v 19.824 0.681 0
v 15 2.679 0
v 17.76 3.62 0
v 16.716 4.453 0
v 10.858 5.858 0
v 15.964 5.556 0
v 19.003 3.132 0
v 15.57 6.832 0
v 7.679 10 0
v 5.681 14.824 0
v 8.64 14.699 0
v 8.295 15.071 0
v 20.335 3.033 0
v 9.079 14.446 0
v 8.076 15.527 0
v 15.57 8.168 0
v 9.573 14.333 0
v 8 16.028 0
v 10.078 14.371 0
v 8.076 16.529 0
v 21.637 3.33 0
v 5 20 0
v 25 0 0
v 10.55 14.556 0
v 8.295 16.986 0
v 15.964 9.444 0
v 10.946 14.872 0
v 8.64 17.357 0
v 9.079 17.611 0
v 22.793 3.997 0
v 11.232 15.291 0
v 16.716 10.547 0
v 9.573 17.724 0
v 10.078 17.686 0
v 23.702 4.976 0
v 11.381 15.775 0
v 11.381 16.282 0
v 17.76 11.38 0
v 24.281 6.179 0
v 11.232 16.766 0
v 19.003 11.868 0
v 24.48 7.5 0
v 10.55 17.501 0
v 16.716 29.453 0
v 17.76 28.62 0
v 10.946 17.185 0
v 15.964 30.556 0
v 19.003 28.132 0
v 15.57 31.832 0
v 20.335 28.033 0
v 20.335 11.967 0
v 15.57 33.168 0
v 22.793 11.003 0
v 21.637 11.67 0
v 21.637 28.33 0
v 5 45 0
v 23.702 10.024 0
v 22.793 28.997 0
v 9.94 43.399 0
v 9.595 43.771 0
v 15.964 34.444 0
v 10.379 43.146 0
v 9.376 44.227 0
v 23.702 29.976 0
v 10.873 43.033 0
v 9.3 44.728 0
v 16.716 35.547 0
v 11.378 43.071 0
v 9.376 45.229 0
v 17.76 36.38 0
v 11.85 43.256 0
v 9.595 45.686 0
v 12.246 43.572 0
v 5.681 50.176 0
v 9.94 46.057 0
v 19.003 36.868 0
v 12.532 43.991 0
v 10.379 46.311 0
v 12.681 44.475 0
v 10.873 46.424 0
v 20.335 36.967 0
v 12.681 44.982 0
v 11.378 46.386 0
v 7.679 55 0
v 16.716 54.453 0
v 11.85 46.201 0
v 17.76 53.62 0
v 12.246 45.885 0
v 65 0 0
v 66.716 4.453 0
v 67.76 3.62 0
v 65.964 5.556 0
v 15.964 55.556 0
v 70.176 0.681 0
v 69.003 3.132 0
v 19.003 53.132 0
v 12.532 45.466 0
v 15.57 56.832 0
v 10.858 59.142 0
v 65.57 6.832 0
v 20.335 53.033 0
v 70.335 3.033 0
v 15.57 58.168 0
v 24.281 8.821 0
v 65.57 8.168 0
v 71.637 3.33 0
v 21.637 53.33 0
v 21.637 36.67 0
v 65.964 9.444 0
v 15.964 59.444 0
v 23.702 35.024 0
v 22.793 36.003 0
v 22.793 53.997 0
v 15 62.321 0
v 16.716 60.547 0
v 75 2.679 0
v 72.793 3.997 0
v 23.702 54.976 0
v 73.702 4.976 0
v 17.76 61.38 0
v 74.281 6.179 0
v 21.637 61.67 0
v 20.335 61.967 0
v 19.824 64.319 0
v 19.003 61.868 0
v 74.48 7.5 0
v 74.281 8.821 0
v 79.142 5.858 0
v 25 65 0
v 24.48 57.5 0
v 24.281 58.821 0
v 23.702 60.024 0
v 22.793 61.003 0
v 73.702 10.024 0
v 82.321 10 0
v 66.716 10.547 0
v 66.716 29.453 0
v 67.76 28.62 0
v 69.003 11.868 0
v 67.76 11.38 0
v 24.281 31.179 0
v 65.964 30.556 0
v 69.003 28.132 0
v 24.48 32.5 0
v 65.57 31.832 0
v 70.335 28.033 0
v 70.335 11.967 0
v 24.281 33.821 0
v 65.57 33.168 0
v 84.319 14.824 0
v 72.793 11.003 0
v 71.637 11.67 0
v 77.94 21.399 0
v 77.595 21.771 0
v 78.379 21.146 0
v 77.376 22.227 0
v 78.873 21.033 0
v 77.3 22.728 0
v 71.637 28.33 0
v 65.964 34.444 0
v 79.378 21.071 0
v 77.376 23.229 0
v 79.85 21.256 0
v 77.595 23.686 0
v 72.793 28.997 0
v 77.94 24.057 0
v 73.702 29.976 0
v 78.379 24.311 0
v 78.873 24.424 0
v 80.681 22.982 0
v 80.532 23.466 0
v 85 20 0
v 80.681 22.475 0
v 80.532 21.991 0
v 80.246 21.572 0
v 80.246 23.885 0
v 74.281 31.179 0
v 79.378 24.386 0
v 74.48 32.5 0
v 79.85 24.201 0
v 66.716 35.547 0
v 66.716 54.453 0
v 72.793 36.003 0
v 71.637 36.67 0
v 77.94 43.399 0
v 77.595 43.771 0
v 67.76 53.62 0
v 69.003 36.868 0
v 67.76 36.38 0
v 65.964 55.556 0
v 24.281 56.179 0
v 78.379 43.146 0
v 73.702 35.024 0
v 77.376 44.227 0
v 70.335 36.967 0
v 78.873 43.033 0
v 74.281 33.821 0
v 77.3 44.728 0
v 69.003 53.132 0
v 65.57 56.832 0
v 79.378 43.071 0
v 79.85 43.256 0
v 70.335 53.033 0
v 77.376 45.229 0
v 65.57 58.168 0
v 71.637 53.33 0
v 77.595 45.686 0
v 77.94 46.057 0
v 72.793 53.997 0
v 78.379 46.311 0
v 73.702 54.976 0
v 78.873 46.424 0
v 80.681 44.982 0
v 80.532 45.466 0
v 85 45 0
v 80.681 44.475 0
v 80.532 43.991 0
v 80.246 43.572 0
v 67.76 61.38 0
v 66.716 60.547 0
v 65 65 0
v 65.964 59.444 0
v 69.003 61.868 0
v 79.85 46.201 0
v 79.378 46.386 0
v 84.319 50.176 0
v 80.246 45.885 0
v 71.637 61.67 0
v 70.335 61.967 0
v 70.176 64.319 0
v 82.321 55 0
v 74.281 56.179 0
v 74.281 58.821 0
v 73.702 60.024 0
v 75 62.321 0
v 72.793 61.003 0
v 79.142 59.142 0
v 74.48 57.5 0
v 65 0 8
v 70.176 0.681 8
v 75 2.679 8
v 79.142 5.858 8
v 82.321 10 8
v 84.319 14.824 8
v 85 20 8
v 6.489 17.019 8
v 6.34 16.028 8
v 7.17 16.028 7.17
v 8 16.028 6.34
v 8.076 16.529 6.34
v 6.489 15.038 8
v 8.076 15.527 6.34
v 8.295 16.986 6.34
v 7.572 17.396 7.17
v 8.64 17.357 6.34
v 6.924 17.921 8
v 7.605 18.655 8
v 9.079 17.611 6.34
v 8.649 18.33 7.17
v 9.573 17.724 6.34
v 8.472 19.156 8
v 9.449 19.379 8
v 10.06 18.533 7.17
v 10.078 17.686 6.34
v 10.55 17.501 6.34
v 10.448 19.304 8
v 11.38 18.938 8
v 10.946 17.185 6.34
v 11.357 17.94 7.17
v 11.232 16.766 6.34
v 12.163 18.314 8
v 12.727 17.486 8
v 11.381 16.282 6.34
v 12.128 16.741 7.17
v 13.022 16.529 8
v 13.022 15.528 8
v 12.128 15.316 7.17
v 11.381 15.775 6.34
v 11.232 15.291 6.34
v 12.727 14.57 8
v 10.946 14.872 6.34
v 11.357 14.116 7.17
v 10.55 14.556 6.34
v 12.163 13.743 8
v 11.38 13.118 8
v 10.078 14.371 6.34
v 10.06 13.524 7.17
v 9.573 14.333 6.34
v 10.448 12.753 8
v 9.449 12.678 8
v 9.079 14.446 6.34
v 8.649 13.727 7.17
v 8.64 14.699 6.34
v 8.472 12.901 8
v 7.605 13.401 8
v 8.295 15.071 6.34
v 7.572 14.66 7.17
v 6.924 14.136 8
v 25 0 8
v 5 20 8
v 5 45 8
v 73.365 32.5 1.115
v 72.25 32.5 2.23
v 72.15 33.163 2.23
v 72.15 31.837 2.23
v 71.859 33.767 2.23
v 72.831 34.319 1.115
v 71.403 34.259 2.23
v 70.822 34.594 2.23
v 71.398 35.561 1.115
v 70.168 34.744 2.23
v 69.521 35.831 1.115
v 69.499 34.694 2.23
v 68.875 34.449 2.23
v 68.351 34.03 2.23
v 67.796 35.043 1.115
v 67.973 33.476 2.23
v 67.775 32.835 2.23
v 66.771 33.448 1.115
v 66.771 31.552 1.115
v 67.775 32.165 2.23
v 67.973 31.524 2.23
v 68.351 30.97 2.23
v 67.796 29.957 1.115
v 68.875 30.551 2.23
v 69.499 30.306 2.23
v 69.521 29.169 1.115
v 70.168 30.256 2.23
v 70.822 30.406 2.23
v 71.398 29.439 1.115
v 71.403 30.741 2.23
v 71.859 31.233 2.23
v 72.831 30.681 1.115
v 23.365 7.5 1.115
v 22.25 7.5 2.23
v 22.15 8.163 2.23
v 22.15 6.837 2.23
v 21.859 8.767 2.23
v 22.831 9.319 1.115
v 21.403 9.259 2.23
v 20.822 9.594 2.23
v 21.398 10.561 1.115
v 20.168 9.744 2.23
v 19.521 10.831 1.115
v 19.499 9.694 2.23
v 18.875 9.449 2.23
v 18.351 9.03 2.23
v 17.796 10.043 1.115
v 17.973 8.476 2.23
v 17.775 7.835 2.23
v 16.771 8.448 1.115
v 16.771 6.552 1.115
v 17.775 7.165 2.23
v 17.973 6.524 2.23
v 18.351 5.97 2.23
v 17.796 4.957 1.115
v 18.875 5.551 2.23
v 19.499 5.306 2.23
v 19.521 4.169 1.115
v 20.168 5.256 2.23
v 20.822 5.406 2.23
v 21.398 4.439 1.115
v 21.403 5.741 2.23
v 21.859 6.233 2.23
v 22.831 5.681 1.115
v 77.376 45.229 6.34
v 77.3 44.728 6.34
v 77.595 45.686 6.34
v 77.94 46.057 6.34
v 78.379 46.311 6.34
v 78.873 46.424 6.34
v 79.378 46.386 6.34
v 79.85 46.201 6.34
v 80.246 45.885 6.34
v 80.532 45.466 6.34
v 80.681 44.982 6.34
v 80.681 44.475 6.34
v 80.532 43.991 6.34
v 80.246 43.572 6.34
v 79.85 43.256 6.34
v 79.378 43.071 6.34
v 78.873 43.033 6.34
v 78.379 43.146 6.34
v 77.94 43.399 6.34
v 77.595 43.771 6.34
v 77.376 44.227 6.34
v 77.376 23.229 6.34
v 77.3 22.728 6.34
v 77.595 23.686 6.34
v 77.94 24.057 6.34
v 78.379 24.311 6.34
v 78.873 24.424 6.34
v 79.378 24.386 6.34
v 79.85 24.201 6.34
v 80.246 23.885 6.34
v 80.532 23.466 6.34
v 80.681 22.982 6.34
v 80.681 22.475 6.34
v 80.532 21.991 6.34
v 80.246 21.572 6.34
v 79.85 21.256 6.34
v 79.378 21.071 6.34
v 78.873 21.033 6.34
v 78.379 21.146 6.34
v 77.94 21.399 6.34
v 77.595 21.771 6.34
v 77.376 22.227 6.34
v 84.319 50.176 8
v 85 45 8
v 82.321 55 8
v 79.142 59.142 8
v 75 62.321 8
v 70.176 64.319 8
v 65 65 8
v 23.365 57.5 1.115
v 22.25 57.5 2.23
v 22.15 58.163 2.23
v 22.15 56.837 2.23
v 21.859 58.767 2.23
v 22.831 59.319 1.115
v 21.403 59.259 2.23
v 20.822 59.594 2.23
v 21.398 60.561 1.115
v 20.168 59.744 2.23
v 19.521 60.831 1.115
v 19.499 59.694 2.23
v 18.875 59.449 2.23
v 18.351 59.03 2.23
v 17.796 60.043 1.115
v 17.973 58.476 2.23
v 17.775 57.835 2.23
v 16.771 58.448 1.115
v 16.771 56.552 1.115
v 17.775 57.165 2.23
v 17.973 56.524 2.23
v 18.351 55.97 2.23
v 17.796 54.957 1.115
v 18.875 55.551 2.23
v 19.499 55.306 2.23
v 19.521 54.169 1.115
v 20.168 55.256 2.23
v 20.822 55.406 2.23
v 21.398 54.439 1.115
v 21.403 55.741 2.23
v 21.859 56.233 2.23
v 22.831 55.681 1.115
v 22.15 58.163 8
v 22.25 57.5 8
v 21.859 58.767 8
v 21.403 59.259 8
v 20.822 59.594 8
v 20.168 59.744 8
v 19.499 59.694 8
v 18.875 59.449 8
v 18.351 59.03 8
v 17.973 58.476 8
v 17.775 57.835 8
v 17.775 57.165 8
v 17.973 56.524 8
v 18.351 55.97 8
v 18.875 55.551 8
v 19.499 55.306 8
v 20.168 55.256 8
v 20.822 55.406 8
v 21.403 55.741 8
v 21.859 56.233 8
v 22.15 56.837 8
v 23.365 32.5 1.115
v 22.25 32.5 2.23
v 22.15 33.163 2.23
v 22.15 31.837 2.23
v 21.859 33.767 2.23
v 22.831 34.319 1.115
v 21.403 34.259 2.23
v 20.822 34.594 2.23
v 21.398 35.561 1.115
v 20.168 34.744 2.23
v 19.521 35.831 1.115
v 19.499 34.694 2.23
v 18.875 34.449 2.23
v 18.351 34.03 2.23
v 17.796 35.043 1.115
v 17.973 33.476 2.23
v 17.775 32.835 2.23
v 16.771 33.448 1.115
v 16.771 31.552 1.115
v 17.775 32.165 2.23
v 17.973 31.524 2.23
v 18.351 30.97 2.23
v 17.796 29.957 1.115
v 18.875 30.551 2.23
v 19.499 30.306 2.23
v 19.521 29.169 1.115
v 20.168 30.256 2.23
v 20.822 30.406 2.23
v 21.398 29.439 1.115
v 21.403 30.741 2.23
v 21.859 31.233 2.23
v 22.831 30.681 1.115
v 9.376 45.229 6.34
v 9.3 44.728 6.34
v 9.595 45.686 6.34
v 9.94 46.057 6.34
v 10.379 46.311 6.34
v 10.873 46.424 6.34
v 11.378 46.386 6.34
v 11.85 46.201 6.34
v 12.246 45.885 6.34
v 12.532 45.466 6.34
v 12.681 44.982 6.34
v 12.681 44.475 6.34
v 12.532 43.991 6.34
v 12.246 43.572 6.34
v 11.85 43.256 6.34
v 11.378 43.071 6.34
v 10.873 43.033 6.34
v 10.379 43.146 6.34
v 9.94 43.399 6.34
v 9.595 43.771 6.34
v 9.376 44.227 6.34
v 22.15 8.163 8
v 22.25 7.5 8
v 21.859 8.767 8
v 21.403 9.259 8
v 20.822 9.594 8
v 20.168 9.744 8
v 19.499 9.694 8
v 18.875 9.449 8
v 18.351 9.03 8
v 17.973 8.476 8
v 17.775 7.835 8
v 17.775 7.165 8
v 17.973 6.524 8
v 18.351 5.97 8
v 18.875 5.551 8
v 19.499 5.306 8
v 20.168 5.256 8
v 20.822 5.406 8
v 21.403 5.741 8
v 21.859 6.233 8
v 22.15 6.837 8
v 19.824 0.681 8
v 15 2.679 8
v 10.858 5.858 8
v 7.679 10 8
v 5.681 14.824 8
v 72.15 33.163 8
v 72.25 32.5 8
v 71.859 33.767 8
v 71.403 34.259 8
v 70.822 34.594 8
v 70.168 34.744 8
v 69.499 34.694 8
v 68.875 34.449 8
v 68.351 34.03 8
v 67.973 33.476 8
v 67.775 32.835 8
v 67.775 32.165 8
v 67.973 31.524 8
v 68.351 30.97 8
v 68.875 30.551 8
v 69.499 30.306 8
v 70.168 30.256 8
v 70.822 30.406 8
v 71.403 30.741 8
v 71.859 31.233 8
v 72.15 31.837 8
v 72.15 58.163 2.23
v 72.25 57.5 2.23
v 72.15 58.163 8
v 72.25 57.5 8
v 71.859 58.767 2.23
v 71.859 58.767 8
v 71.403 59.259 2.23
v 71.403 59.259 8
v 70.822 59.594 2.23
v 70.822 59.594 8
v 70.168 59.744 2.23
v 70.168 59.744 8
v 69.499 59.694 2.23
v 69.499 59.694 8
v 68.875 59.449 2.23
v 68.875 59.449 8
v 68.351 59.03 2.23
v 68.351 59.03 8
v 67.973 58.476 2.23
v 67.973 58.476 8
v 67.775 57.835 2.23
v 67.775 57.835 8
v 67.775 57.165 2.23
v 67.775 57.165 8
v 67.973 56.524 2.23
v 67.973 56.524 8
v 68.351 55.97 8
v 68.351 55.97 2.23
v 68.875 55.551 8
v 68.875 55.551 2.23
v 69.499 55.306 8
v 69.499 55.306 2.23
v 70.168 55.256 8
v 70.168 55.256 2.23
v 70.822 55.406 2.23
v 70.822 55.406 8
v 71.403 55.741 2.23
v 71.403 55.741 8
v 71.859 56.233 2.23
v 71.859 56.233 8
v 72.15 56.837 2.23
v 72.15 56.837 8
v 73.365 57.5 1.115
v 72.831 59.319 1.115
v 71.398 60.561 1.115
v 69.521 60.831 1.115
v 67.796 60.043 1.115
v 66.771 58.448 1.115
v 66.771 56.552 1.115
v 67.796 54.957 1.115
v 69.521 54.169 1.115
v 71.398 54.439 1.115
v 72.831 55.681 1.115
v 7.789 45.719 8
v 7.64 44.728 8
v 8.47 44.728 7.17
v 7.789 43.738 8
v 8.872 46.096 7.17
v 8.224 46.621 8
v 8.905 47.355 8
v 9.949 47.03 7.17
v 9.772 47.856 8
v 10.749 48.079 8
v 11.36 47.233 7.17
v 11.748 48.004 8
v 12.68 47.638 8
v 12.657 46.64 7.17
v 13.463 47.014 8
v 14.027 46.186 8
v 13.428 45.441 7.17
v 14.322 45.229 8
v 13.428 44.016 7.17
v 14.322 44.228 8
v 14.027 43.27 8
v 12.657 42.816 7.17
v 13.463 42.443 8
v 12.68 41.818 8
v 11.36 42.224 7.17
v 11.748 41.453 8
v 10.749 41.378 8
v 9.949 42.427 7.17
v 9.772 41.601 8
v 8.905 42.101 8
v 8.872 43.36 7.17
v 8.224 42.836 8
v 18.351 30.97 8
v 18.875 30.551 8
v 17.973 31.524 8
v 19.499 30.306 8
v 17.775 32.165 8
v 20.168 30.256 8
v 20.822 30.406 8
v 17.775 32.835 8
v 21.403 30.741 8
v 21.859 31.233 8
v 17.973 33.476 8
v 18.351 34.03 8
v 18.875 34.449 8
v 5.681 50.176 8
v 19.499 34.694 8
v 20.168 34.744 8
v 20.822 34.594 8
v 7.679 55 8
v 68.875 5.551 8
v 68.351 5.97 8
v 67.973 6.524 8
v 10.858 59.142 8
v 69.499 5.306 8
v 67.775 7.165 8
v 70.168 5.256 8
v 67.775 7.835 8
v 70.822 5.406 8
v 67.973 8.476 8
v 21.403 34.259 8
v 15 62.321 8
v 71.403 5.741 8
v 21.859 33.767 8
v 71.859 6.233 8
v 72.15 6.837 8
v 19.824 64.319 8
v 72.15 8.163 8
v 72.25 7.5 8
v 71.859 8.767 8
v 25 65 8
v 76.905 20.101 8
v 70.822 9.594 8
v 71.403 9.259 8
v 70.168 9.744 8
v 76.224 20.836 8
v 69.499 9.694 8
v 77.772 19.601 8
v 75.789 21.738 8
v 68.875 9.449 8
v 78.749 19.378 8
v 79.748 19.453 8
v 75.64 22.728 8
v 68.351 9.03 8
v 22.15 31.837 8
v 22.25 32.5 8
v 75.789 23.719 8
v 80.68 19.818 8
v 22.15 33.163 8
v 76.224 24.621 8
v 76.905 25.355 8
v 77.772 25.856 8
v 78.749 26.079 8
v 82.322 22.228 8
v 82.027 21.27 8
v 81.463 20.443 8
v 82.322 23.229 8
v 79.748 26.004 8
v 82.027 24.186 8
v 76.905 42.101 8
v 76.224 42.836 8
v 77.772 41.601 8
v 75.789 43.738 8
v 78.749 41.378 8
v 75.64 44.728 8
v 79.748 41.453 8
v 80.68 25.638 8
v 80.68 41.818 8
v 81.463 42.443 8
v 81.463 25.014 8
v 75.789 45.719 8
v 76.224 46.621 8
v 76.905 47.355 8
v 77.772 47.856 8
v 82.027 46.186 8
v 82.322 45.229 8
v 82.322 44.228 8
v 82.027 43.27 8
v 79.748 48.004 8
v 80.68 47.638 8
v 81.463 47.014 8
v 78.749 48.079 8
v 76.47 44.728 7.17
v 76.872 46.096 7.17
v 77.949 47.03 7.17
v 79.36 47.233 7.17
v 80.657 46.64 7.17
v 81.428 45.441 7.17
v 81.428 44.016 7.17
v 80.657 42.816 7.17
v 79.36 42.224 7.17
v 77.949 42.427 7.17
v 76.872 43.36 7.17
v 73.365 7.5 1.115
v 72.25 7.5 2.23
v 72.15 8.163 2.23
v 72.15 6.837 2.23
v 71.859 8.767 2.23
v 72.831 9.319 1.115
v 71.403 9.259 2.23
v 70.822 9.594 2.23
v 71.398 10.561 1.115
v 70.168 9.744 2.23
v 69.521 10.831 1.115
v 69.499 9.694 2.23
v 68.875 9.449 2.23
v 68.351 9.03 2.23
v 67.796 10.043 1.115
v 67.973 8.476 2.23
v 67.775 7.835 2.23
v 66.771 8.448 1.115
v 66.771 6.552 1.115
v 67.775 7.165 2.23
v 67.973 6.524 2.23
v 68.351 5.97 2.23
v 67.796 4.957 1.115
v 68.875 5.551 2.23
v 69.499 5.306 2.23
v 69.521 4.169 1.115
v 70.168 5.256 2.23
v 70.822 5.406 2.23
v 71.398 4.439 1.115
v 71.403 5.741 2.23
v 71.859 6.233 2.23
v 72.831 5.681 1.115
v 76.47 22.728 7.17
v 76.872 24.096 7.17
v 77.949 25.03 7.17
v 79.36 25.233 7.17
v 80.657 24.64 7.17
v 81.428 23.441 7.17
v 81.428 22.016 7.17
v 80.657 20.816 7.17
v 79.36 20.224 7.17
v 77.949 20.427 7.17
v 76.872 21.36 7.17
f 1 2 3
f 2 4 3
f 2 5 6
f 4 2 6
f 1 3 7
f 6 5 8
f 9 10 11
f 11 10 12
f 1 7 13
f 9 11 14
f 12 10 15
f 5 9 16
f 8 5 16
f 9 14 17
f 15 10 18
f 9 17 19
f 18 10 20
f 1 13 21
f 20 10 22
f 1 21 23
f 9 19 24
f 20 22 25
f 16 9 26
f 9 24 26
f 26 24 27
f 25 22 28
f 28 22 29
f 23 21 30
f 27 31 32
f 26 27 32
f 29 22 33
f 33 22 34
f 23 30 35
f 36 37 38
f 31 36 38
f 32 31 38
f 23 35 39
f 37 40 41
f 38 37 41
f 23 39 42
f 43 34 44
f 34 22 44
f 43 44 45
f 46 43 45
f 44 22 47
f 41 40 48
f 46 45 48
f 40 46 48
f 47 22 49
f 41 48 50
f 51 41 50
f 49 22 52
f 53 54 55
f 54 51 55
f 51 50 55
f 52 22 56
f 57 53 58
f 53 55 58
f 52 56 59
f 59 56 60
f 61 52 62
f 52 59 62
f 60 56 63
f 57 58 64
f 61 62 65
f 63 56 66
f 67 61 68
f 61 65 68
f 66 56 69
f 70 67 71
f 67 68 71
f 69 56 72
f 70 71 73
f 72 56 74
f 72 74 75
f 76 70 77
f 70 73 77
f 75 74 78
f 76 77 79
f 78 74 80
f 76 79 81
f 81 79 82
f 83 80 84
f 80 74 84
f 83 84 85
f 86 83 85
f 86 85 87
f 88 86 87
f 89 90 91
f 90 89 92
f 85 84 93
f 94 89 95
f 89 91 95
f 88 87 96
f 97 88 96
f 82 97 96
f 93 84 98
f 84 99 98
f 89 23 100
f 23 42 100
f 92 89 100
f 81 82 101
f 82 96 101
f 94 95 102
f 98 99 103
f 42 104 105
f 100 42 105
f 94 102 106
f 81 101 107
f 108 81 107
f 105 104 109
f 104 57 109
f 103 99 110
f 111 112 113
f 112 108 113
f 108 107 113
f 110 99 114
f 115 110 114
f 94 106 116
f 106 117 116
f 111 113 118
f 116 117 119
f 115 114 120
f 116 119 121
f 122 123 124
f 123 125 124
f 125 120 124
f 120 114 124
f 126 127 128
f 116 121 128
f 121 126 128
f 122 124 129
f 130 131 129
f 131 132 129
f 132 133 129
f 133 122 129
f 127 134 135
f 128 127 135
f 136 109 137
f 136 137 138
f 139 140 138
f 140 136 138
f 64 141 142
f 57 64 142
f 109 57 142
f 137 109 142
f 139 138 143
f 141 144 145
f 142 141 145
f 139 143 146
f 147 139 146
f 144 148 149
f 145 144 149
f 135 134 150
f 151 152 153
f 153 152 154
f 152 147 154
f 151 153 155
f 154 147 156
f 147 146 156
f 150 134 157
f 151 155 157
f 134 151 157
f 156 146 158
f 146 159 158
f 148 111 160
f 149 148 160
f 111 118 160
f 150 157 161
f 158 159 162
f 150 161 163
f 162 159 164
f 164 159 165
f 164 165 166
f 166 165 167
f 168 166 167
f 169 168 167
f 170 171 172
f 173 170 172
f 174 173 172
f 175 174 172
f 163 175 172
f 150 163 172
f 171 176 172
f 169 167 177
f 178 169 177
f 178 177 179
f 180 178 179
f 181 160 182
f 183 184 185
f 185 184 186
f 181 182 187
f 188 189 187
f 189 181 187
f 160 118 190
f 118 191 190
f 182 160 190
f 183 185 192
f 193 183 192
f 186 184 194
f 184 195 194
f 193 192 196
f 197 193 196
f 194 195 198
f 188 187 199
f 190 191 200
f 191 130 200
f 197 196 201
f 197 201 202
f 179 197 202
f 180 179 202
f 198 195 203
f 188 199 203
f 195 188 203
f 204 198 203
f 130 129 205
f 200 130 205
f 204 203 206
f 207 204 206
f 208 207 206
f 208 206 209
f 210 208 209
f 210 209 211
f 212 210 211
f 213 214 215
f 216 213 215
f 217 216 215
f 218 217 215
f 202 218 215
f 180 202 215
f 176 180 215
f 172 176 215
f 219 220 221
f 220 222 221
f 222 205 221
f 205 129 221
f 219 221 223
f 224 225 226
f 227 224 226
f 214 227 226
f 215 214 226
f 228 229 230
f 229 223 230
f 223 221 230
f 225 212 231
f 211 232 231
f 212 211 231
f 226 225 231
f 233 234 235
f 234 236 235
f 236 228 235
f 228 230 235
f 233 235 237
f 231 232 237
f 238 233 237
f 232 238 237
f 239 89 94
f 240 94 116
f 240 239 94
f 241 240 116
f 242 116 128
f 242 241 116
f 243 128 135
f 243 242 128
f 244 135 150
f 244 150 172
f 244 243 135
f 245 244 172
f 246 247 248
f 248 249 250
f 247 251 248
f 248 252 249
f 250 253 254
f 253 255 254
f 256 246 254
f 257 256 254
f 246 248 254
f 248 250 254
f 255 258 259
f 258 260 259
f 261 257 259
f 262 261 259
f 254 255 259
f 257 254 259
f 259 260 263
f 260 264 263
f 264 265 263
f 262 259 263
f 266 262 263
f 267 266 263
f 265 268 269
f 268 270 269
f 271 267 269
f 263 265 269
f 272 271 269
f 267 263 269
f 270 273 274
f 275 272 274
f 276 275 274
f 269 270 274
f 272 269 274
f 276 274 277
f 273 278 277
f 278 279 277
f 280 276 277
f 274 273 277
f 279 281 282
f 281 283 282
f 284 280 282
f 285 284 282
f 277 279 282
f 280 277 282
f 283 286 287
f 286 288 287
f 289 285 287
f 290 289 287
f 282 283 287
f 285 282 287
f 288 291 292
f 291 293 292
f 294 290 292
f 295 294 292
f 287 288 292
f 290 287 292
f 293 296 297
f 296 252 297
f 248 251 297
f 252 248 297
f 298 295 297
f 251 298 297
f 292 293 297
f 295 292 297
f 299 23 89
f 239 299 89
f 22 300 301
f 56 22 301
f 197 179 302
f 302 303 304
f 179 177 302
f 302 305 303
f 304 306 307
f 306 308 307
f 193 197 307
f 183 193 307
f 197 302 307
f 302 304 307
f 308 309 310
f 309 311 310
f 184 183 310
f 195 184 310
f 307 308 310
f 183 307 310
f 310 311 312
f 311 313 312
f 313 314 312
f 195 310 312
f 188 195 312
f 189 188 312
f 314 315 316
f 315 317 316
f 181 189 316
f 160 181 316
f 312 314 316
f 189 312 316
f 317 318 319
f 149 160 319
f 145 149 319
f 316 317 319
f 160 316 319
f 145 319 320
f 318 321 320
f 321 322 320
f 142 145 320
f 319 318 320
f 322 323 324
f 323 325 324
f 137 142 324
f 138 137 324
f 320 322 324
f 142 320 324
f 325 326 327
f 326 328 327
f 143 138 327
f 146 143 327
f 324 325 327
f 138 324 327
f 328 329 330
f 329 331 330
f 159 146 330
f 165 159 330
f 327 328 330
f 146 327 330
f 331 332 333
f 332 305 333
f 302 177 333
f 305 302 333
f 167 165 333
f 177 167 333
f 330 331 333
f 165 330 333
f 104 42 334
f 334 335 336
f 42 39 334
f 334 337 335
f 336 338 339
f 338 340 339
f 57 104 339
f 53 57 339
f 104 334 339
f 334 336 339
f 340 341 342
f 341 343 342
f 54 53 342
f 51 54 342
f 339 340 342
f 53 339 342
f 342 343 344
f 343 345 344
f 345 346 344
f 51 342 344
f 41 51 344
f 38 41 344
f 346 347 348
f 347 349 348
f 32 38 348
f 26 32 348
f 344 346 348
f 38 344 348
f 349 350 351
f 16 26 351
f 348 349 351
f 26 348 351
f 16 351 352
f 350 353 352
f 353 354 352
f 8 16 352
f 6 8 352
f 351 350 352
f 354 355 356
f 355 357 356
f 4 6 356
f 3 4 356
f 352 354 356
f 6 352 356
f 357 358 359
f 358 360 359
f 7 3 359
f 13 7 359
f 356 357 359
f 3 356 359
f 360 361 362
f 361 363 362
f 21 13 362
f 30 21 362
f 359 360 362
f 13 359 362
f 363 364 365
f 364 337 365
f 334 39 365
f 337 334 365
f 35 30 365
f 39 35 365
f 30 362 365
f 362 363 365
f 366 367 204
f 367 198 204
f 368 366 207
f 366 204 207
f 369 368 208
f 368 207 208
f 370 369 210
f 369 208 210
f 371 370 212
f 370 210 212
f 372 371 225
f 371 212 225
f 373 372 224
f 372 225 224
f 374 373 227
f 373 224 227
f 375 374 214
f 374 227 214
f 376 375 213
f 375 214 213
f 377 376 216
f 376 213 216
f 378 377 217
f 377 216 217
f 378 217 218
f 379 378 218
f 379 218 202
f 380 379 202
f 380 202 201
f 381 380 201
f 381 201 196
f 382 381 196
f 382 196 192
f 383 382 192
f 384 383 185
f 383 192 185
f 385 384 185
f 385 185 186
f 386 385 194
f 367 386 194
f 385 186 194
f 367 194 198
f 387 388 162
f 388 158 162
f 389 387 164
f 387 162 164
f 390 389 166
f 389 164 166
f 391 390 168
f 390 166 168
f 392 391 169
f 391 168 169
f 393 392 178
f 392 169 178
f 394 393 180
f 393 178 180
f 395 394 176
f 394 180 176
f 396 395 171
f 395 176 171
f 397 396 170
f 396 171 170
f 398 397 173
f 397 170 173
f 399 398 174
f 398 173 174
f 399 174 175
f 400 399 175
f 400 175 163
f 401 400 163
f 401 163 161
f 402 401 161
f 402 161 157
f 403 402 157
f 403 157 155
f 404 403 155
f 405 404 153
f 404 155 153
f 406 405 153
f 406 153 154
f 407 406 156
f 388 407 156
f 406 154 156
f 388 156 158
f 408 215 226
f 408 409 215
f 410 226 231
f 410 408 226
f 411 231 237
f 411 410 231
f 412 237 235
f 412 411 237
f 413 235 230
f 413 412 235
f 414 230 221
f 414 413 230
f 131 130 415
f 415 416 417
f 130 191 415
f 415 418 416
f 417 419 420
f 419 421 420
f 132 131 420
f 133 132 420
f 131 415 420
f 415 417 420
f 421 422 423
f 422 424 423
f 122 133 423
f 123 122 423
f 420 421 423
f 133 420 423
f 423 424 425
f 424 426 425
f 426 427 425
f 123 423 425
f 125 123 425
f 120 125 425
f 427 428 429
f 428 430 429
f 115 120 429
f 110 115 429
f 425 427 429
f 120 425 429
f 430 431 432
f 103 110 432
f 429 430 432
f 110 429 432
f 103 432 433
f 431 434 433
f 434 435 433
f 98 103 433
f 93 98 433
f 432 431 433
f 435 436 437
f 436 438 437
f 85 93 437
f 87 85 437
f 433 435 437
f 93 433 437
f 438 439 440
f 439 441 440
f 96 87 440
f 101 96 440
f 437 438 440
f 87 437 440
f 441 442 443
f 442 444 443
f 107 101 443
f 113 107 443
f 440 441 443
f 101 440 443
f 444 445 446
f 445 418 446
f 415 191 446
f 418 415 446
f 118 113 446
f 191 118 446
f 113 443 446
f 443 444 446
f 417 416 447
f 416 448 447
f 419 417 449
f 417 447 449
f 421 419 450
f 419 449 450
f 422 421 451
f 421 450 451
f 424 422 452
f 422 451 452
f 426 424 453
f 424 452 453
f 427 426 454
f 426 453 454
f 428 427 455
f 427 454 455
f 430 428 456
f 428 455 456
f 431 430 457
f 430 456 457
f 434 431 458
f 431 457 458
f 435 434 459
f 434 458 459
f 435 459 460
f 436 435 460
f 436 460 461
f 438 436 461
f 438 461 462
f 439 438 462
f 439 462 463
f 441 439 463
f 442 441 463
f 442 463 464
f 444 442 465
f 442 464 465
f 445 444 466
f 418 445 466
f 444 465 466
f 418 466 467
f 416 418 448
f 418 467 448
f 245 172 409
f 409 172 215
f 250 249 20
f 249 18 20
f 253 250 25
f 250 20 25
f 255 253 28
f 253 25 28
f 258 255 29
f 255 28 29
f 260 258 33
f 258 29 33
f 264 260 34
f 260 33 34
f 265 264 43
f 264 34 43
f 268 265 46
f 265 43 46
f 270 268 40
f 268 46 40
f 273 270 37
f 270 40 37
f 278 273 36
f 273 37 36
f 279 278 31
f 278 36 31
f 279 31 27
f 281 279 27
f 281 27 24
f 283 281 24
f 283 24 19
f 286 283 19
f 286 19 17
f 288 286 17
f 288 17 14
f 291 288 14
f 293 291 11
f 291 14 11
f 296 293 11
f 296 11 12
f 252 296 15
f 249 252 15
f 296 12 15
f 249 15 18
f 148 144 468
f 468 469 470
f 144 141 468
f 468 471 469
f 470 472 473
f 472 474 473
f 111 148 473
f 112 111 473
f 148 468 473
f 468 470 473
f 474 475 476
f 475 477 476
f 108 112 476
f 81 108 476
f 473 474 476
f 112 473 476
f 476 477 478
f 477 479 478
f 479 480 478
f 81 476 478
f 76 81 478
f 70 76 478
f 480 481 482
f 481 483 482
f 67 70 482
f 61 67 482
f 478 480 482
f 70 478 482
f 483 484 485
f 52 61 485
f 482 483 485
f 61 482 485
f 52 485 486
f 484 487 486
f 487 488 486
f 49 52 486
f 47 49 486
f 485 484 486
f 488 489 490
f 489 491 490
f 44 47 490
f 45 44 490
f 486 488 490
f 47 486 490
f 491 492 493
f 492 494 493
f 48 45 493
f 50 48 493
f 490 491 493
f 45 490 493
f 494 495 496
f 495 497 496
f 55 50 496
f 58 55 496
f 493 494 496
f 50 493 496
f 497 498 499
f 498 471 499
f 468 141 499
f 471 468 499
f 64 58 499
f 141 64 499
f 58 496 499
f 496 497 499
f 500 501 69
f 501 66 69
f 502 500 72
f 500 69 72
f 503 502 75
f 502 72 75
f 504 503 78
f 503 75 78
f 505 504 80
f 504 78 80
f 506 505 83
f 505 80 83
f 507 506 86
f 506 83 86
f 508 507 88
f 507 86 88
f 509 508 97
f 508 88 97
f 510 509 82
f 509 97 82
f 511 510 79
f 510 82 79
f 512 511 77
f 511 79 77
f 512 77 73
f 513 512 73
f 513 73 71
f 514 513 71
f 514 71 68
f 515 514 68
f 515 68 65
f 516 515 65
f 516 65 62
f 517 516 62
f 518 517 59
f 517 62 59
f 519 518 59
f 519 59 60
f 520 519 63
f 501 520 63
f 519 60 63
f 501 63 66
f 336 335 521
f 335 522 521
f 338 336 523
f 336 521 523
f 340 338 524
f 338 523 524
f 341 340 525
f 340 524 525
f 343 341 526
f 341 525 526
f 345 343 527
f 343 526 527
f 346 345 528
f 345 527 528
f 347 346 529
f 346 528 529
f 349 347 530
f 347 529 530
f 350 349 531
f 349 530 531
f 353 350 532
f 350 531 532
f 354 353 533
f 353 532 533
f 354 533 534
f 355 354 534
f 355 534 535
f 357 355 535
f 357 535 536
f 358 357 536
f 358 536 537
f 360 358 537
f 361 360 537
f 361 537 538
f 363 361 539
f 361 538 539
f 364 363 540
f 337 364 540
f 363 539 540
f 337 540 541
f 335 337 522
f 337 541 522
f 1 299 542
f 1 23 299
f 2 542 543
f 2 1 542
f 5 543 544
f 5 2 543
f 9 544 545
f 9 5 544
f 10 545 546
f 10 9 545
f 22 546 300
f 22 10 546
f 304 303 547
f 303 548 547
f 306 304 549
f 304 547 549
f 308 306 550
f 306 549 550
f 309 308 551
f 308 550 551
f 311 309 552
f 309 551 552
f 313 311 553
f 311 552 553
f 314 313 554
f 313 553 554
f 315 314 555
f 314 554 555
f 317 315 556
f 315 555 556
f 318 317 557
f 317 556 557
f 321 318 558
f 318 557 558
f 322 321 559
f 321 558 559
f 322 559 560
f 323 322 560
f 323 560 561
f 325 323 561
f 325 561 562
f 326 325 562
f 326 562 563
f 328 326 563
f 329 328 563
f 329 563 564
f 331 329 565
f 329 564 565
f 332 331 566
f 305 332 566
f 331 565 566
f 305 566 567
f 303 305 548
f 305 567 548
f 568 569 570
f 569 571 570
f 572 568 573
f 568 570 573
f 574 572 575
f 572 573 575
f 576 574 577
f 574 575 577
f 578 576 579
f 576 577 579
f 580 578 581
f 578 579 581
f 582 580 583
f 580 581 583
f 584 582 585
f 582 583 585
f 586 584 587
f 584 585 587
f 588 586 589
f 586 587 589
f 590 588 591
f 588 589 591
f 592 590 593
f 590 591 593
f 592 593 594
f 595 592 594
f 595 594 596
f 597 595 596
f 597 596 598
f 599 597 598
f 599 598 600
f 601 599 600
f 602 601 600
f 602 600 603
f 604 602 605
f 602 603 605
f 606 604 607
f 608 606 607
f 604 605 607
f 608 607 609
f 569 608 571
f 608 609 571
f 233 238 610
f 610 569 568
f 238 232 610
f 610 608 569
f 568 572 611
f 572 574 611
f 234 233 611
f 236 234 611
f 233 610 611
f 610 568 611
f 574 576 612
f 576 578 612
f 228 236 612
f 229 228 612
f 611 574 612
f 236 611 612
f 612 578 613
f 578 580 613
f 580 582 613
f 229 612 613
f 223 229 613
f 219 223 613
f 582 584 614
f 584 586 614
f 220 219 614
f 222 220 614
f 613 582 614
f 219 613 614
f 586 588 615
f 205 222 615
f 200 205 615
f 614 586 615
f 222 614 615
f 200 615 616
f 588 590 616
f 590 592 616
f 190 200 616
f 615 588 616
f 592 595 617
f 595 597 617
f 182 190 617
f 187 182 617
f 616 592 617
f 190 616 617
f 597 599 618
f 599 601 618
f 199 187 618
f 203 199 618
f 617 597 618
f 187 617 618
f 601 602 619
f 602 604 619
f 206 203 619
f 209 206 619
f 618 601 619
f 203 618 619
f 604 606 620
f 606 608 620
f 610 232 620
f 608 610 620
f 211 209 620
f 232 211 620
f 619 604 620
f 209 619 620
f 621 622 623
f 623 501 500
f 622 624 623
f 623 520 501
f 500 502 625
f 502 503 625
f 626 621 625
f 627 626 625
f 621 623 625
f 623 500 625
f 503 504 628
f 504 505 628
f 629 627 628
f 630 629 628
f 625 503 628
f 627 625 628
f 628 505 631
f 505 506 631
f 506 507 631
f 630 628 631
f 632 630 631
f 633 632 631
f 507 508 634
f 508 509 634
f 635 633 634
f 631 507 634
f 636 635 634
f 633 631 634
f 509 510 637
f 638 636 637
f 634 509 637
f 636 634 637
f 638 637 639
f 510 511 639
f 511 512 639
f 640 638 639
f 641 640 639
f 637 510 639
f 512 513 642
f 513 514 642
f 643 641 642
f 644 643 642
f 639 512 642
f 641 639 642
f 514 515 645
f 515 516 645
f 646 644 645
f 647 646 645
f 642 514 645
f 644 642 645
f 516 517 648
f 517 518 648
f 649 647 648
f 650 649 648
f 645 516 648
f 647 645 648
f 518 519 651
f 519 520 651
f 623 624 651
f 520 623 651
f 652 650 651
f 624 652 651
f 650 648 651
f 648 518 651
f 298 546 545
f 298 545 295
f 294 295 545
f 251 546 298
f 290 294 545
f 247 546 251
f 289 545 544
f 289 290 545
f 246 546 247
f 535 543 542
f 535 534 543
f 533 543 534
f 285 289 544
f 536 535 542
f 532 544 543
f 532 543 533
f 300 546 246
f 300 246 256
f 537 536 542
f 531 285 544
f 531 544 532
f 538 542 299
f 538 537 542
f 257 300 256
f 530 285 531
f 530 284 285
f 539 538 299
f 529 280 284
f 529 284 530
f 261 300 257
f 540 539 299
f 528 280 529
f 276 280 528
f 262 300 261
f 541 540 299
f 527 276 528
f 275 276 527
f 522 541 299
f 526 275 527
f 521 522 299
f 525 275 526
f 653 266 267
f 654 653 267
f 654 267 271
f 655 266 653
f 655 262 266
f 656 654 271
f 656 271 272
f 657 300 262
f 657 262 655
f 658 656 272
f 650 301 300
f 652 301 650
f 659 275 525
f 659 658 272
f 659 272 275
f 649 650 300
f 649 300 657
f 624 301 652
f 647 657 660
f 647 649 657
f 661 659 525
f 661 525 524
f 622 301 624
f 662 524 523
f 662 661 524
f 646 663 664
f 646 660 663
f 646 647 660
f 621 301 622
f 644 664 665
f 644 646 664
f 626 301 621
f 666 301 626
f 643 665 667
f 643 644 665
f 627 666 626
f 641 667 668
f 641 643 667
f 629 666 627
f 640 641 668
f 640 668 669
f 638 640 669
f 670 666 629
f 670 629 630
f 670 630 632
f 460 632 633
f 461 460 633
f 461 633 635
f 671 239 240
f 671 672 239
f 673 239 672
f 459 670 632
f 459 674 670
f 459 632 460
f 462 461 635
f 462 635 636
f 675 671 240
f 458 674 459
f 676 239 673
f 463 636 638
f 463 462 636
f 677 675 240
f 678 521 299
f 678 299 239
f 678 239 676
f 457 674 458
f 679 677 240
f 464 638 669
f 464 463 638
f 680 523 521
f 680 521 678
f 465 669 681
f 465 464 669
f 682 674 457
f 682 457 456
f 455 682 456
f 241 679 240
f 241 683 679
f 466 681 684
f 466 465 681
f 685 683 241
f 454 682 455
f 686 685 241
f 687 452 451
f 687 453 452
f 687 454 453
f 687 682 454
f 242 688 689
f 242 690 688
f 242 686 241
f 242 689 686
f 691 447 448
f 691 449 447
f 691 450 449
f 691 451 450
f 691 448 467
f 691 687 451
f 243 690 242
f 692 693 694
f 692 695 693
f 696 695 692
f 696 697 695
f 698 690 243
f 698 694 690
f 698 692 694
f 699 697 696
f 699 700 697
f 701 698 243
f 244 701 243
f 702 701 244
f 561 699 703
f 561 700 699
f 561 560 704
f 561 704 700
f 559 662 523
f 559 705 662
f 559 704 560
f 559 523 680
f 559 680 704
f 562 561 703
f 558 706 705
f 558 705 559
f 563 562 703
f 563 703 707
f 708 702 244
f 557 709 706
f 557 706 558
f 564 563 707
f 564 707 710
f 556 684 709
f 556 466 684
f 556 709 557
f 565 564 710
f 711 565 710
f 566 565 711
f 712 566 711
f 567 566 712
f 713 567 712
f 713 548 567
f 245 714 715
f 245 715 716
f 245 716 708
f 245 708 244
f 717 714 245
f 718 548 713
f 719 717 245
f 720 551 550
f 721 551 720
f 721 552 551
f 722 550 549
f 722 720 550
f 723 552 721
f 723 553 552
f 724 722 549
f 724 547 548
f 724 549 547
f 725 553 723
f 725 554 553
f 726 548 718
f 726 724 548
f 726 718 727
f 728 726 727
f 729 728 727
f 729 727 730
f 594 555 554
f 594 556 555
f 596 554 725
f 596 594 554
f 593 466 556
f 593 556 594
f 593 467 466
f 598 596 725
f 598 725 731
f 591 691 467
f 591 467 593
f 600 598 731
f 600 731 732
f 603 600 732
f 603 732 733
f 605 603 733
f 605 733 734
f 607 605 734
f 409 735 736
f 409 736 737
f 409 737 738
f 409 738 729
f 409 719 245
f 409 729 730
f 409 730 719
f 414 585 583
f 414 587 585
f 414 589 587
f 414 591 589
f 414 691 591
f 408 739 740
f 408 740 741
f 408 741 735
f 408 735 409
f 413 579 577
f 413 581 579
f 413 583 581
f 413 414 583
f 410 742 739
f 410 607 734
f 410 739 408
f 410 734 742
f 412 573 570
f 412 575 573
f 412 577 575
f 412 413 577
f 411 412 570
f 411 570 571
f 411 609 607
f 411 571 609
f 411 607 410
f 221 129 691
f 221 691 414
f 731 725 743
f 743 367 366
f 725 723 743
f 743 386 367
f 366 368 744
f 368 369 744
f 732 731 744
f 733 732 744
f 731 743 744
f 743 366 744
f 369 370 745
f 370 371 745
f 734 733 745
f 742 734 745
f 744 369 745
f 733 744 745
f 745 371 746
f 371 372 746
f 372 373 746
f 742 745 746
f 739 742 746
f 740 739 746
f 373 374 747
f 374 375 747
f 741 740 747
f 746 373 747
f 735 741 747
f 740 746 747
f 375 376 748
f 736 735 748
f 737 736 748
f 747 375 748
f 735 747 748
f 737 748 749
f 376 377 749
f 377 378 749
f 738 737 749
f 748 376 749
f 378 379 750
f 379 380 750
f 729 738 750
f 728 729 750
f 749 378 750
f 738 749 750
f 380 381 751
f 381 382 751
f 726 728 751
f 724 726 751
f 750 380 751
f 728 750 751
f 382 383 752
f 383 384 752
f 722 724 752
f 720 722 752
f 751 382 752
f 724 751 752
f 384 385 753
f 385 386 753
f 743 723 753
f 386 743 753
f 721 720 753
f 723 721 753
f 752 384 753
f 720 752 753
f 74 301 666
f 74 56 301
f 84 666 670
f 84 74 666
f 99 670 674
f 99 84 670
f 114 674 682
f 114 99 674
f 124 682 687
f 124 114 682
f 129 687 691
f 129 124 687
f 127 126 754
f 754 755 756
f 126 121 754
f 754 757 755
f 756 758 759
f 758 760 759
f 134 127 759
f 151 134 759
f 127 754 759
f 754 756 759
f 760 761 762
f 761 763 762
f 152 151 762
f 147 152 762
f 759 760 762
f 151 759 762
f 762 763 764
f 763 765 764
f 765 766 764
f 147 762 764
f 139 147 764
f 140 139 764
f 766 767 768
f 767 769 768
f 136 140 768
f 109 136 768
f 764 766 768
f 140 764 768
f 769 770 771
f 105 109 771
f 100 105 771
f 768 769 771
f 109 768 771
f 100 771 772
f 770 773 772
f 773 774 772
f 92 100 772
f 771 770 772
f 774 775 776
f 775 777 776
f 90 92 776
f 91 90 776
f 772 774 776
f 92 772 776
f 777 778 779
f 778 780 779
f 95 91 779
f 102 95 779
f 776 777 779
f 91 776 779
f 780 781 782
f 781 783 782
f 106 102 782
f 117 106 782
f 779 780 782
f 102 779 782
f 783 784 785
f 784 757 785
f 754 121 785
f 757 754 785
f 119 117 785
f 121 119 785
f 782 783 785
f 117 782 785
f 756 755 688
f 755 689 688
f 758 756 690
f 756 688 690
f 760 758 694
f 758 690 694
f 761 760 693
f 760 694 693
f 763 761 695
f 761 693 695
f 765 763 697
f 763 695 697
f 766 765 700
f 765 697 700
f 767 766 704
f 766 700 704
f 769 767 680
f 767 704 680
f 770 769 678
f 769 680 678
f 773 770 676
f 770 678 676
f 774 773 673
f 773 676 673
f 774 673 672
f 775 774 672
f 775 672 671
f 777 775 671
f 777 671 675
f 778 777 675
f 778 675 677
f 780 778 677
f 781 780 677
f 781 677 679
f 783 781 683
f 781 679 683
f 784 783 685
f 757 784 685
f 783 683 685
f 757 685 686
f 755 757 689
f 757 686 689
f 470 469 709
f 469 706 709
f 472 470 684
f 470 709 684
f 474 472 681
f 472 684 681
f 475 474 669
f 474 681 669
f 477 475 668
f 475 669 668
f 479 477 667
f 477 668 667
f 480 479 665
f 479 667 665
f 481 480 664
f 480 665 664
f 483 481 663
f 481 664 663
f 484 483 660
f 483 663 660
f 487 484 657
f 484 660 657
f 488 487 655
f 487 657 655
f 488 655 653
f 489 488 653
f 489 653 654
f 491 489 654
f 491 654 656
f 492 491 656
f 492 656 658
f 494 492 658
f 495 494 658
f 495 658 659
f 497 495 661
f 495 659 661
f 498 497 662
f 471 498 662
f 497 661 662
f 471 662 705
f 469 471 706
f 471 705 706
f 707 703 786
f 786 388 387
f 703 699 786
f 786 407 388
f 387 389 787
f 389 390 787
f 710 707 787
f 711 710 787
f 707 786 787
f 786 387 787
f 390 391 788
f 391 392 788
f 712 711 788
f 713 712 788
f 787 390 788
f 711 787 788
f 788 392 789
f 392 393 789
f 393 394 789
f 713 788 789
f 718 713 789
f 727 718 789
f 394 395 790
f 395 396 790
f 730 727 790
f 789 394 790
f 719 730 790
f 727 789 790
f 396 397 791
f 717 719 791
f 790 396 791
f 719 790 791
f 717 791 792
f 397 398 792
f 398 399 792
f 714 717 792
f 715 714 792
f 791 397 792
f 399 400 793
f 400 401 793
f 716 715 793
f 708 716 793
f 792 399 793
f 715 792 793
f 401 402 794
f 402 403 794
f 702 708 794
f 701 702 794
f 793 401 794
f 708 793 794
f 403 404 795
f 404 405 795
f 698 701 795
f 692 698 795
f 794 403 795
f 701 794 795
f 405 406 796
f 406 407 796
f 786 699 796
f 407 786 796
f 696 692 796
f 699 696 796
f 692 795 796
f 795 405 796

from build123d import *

# Parameters (mm, degrees)
SKETCH1_W                                            = 85
SKETCH1_H                                            = 65
BOSS_EXTRUDE1_DEPTH                                  = 8
CSK_FOR_M4_HEX_SOCKET_COUNTERSUNK_CAP_SC_D           = 4.5
CSK_FOR_M4_HEX_SOCKET_COUNTERSUNK_CAP_SC_DEPTH       = 10.648063607
CSK_FOR_M4_HEX_SOCKET_COUNTERSUNK_CAP_SC_CSINK_D     = 8.96
CSK_FOR_M4_HEX_SOCKET_COUNTERSUNK_CAP_SC_CSINK_ANGLE = 90
CSK_FOR_M4_HEX_SOCKET_COUNTERSUNK_CAP_SC_TIP         = 1.351936393
CSK_FOR_M3_HEX_SOCKET_COUNTERSUNK_CAP_SC_D           = 3.4
CSK_FOR_M3_HEX_SOCKET_COUNTERSUNK_CAP_SC_DEPTH       = 10.978536948
CSK_FOR_M3_HEX_SOCKET_COUNTERSUNK_CAP_SC_CSINK_D     = 6.72
CSK_FOR_M3_HEX_SOCKET_COUNTERSUNK_CAP_SC_CSINK_ANGLE = 90
CSK_FOR_M3_HEX_SOCKET_COUNTERSUNK_CAP_SC_TIP         = 1.021463052
SKETCH11_W                                           = 5
SKETCH11_H                                           = 65
CUT_EXTRUDE1_DEPTH                                   = 108.30330843
FILLET1_R                                            = 20


with BuildPart() as part:
    # Sketch1 → Boss-Extrude1 (new body)
    with BuildSketch(Plane.XY):
        with Locations((42.5, 32.5)):
            Rectangle(SKETCH1_W, SKETCH1_H)
    extrude(amount=BOSS_EXTRUDE1_DEPTH)

    # CSK for M4 Hex Socket Countersunk Cap Screw1
    with Locations(Plane(origin=(0, 0, 0), x_dir=(-1, 0, 0), z_dir=(0, 0, -1))):
        with Locations((-70, 57.5), (-20, 57.5), (-20, 32.5), (-70, 32.5), (-70, 7.5), (-20, 7.5)):
            CounterSinkHole(CSK_FOR_M4_HEX_SOCKET_COUNTERSUNK_CAP_SC_D / 2, CSK_FOR_M4_HEX_SOCKET_COUNTERSUNK_CAP_SC_CSINK_D / 2, depth=CSK_FOR_M4_HEX_SOCKET_COUNTERSUNK_CAP_SC_DEPTH, counter_sink_angle=CSK_FOR_M4_HEX_SOCKET_COUNTERSUNK_CAP_SC_CSINK_ANGLE)
            with Locations((0, 0, -(CSK_FOR_M4_HEX_SOCKET_COUNTERSUNK_CAP_SC_DEPTH + CSK_FOR_M4_HEX_SOCKET_COUNTERSUNK_CAP_SC_TIP / 2))):  # 118° drill point
                Cone(0, CSK_FOR_M4_HEX_SOCKET_COUNTERSUNK_CAP_SC_D / 2, CSK_FOR_M4_HEX_SOCKET_COUNTERSUNK_CAP_SC_TIP, mode=Mode.SUBTRACT)

    # CSK for M3 Hex Socket Countersunk Cap Screw1
    with Locations(Plane.XY.offset(8)):
        with Locations((11, 44.728312208), (79, 44.728312208), (79, 22.728312208), (9.7, 16.028312208)):
            CounterSinkHole(CSK_FOR_M3_HEX_SOCKET_COUNTERSUNK_CAP_SC_D / 2, CSK_FOR_M3_HEX_SOCKET_COUNTERSUNK_CAP_SC_CSINK_D / 2, depth=CSK_FOR_M3_HEX_SOCKET_COUNTERSUNK_CAP_SC_DEPTH, counter_sink_angle=CSK_FOR_M3_HEX_SOCKET_COUNTERSUNK_CAP_SC_CSINK_ANGLE)
            with Locations((0, 0, -(CSK_FOR_M3_HEX_SOCKET_COUNTERSUNK_CAP_SC_DEPTH + CSK_FOR_M3_HEX_SOCKET_COUNTERSUNK_CAP_SC_TIP / 2))):  # 118° drill point
                Cone(0, CSK_FOR_M3_HEX_SOCKET_COUNTERSUNK_CAP_SC_D / 2, CSK_FOR_M3_HEX_SOCKET_COUNTERSUNK_CAP_SC_TIP, mode=Mode.SUBTRACT)

    # Sketch11 → Cut-Extrude1 (cut, through all)
    with BuildSketch(Plane.XY.offset(8)):
        with Locations((2.5, 32.5)):
            Rectangle(SKETCH11_W, SKETCH11_H)
    extrude(amount=-CUT_EXTRUDE1_DEPTH, mode=Mode.SUBTRACT)

    # Fillet1
    fillet1_edges = [part.edges().sort_by_distance(p)[0] for p in [
        (85, 65, 4),
        (85, 0, 4),
        (5, 65, 4),
        (5, 0, 4),
    ]]
    fillet(fillet1_edges, radius=FILLET1_R)


solid = part.part
